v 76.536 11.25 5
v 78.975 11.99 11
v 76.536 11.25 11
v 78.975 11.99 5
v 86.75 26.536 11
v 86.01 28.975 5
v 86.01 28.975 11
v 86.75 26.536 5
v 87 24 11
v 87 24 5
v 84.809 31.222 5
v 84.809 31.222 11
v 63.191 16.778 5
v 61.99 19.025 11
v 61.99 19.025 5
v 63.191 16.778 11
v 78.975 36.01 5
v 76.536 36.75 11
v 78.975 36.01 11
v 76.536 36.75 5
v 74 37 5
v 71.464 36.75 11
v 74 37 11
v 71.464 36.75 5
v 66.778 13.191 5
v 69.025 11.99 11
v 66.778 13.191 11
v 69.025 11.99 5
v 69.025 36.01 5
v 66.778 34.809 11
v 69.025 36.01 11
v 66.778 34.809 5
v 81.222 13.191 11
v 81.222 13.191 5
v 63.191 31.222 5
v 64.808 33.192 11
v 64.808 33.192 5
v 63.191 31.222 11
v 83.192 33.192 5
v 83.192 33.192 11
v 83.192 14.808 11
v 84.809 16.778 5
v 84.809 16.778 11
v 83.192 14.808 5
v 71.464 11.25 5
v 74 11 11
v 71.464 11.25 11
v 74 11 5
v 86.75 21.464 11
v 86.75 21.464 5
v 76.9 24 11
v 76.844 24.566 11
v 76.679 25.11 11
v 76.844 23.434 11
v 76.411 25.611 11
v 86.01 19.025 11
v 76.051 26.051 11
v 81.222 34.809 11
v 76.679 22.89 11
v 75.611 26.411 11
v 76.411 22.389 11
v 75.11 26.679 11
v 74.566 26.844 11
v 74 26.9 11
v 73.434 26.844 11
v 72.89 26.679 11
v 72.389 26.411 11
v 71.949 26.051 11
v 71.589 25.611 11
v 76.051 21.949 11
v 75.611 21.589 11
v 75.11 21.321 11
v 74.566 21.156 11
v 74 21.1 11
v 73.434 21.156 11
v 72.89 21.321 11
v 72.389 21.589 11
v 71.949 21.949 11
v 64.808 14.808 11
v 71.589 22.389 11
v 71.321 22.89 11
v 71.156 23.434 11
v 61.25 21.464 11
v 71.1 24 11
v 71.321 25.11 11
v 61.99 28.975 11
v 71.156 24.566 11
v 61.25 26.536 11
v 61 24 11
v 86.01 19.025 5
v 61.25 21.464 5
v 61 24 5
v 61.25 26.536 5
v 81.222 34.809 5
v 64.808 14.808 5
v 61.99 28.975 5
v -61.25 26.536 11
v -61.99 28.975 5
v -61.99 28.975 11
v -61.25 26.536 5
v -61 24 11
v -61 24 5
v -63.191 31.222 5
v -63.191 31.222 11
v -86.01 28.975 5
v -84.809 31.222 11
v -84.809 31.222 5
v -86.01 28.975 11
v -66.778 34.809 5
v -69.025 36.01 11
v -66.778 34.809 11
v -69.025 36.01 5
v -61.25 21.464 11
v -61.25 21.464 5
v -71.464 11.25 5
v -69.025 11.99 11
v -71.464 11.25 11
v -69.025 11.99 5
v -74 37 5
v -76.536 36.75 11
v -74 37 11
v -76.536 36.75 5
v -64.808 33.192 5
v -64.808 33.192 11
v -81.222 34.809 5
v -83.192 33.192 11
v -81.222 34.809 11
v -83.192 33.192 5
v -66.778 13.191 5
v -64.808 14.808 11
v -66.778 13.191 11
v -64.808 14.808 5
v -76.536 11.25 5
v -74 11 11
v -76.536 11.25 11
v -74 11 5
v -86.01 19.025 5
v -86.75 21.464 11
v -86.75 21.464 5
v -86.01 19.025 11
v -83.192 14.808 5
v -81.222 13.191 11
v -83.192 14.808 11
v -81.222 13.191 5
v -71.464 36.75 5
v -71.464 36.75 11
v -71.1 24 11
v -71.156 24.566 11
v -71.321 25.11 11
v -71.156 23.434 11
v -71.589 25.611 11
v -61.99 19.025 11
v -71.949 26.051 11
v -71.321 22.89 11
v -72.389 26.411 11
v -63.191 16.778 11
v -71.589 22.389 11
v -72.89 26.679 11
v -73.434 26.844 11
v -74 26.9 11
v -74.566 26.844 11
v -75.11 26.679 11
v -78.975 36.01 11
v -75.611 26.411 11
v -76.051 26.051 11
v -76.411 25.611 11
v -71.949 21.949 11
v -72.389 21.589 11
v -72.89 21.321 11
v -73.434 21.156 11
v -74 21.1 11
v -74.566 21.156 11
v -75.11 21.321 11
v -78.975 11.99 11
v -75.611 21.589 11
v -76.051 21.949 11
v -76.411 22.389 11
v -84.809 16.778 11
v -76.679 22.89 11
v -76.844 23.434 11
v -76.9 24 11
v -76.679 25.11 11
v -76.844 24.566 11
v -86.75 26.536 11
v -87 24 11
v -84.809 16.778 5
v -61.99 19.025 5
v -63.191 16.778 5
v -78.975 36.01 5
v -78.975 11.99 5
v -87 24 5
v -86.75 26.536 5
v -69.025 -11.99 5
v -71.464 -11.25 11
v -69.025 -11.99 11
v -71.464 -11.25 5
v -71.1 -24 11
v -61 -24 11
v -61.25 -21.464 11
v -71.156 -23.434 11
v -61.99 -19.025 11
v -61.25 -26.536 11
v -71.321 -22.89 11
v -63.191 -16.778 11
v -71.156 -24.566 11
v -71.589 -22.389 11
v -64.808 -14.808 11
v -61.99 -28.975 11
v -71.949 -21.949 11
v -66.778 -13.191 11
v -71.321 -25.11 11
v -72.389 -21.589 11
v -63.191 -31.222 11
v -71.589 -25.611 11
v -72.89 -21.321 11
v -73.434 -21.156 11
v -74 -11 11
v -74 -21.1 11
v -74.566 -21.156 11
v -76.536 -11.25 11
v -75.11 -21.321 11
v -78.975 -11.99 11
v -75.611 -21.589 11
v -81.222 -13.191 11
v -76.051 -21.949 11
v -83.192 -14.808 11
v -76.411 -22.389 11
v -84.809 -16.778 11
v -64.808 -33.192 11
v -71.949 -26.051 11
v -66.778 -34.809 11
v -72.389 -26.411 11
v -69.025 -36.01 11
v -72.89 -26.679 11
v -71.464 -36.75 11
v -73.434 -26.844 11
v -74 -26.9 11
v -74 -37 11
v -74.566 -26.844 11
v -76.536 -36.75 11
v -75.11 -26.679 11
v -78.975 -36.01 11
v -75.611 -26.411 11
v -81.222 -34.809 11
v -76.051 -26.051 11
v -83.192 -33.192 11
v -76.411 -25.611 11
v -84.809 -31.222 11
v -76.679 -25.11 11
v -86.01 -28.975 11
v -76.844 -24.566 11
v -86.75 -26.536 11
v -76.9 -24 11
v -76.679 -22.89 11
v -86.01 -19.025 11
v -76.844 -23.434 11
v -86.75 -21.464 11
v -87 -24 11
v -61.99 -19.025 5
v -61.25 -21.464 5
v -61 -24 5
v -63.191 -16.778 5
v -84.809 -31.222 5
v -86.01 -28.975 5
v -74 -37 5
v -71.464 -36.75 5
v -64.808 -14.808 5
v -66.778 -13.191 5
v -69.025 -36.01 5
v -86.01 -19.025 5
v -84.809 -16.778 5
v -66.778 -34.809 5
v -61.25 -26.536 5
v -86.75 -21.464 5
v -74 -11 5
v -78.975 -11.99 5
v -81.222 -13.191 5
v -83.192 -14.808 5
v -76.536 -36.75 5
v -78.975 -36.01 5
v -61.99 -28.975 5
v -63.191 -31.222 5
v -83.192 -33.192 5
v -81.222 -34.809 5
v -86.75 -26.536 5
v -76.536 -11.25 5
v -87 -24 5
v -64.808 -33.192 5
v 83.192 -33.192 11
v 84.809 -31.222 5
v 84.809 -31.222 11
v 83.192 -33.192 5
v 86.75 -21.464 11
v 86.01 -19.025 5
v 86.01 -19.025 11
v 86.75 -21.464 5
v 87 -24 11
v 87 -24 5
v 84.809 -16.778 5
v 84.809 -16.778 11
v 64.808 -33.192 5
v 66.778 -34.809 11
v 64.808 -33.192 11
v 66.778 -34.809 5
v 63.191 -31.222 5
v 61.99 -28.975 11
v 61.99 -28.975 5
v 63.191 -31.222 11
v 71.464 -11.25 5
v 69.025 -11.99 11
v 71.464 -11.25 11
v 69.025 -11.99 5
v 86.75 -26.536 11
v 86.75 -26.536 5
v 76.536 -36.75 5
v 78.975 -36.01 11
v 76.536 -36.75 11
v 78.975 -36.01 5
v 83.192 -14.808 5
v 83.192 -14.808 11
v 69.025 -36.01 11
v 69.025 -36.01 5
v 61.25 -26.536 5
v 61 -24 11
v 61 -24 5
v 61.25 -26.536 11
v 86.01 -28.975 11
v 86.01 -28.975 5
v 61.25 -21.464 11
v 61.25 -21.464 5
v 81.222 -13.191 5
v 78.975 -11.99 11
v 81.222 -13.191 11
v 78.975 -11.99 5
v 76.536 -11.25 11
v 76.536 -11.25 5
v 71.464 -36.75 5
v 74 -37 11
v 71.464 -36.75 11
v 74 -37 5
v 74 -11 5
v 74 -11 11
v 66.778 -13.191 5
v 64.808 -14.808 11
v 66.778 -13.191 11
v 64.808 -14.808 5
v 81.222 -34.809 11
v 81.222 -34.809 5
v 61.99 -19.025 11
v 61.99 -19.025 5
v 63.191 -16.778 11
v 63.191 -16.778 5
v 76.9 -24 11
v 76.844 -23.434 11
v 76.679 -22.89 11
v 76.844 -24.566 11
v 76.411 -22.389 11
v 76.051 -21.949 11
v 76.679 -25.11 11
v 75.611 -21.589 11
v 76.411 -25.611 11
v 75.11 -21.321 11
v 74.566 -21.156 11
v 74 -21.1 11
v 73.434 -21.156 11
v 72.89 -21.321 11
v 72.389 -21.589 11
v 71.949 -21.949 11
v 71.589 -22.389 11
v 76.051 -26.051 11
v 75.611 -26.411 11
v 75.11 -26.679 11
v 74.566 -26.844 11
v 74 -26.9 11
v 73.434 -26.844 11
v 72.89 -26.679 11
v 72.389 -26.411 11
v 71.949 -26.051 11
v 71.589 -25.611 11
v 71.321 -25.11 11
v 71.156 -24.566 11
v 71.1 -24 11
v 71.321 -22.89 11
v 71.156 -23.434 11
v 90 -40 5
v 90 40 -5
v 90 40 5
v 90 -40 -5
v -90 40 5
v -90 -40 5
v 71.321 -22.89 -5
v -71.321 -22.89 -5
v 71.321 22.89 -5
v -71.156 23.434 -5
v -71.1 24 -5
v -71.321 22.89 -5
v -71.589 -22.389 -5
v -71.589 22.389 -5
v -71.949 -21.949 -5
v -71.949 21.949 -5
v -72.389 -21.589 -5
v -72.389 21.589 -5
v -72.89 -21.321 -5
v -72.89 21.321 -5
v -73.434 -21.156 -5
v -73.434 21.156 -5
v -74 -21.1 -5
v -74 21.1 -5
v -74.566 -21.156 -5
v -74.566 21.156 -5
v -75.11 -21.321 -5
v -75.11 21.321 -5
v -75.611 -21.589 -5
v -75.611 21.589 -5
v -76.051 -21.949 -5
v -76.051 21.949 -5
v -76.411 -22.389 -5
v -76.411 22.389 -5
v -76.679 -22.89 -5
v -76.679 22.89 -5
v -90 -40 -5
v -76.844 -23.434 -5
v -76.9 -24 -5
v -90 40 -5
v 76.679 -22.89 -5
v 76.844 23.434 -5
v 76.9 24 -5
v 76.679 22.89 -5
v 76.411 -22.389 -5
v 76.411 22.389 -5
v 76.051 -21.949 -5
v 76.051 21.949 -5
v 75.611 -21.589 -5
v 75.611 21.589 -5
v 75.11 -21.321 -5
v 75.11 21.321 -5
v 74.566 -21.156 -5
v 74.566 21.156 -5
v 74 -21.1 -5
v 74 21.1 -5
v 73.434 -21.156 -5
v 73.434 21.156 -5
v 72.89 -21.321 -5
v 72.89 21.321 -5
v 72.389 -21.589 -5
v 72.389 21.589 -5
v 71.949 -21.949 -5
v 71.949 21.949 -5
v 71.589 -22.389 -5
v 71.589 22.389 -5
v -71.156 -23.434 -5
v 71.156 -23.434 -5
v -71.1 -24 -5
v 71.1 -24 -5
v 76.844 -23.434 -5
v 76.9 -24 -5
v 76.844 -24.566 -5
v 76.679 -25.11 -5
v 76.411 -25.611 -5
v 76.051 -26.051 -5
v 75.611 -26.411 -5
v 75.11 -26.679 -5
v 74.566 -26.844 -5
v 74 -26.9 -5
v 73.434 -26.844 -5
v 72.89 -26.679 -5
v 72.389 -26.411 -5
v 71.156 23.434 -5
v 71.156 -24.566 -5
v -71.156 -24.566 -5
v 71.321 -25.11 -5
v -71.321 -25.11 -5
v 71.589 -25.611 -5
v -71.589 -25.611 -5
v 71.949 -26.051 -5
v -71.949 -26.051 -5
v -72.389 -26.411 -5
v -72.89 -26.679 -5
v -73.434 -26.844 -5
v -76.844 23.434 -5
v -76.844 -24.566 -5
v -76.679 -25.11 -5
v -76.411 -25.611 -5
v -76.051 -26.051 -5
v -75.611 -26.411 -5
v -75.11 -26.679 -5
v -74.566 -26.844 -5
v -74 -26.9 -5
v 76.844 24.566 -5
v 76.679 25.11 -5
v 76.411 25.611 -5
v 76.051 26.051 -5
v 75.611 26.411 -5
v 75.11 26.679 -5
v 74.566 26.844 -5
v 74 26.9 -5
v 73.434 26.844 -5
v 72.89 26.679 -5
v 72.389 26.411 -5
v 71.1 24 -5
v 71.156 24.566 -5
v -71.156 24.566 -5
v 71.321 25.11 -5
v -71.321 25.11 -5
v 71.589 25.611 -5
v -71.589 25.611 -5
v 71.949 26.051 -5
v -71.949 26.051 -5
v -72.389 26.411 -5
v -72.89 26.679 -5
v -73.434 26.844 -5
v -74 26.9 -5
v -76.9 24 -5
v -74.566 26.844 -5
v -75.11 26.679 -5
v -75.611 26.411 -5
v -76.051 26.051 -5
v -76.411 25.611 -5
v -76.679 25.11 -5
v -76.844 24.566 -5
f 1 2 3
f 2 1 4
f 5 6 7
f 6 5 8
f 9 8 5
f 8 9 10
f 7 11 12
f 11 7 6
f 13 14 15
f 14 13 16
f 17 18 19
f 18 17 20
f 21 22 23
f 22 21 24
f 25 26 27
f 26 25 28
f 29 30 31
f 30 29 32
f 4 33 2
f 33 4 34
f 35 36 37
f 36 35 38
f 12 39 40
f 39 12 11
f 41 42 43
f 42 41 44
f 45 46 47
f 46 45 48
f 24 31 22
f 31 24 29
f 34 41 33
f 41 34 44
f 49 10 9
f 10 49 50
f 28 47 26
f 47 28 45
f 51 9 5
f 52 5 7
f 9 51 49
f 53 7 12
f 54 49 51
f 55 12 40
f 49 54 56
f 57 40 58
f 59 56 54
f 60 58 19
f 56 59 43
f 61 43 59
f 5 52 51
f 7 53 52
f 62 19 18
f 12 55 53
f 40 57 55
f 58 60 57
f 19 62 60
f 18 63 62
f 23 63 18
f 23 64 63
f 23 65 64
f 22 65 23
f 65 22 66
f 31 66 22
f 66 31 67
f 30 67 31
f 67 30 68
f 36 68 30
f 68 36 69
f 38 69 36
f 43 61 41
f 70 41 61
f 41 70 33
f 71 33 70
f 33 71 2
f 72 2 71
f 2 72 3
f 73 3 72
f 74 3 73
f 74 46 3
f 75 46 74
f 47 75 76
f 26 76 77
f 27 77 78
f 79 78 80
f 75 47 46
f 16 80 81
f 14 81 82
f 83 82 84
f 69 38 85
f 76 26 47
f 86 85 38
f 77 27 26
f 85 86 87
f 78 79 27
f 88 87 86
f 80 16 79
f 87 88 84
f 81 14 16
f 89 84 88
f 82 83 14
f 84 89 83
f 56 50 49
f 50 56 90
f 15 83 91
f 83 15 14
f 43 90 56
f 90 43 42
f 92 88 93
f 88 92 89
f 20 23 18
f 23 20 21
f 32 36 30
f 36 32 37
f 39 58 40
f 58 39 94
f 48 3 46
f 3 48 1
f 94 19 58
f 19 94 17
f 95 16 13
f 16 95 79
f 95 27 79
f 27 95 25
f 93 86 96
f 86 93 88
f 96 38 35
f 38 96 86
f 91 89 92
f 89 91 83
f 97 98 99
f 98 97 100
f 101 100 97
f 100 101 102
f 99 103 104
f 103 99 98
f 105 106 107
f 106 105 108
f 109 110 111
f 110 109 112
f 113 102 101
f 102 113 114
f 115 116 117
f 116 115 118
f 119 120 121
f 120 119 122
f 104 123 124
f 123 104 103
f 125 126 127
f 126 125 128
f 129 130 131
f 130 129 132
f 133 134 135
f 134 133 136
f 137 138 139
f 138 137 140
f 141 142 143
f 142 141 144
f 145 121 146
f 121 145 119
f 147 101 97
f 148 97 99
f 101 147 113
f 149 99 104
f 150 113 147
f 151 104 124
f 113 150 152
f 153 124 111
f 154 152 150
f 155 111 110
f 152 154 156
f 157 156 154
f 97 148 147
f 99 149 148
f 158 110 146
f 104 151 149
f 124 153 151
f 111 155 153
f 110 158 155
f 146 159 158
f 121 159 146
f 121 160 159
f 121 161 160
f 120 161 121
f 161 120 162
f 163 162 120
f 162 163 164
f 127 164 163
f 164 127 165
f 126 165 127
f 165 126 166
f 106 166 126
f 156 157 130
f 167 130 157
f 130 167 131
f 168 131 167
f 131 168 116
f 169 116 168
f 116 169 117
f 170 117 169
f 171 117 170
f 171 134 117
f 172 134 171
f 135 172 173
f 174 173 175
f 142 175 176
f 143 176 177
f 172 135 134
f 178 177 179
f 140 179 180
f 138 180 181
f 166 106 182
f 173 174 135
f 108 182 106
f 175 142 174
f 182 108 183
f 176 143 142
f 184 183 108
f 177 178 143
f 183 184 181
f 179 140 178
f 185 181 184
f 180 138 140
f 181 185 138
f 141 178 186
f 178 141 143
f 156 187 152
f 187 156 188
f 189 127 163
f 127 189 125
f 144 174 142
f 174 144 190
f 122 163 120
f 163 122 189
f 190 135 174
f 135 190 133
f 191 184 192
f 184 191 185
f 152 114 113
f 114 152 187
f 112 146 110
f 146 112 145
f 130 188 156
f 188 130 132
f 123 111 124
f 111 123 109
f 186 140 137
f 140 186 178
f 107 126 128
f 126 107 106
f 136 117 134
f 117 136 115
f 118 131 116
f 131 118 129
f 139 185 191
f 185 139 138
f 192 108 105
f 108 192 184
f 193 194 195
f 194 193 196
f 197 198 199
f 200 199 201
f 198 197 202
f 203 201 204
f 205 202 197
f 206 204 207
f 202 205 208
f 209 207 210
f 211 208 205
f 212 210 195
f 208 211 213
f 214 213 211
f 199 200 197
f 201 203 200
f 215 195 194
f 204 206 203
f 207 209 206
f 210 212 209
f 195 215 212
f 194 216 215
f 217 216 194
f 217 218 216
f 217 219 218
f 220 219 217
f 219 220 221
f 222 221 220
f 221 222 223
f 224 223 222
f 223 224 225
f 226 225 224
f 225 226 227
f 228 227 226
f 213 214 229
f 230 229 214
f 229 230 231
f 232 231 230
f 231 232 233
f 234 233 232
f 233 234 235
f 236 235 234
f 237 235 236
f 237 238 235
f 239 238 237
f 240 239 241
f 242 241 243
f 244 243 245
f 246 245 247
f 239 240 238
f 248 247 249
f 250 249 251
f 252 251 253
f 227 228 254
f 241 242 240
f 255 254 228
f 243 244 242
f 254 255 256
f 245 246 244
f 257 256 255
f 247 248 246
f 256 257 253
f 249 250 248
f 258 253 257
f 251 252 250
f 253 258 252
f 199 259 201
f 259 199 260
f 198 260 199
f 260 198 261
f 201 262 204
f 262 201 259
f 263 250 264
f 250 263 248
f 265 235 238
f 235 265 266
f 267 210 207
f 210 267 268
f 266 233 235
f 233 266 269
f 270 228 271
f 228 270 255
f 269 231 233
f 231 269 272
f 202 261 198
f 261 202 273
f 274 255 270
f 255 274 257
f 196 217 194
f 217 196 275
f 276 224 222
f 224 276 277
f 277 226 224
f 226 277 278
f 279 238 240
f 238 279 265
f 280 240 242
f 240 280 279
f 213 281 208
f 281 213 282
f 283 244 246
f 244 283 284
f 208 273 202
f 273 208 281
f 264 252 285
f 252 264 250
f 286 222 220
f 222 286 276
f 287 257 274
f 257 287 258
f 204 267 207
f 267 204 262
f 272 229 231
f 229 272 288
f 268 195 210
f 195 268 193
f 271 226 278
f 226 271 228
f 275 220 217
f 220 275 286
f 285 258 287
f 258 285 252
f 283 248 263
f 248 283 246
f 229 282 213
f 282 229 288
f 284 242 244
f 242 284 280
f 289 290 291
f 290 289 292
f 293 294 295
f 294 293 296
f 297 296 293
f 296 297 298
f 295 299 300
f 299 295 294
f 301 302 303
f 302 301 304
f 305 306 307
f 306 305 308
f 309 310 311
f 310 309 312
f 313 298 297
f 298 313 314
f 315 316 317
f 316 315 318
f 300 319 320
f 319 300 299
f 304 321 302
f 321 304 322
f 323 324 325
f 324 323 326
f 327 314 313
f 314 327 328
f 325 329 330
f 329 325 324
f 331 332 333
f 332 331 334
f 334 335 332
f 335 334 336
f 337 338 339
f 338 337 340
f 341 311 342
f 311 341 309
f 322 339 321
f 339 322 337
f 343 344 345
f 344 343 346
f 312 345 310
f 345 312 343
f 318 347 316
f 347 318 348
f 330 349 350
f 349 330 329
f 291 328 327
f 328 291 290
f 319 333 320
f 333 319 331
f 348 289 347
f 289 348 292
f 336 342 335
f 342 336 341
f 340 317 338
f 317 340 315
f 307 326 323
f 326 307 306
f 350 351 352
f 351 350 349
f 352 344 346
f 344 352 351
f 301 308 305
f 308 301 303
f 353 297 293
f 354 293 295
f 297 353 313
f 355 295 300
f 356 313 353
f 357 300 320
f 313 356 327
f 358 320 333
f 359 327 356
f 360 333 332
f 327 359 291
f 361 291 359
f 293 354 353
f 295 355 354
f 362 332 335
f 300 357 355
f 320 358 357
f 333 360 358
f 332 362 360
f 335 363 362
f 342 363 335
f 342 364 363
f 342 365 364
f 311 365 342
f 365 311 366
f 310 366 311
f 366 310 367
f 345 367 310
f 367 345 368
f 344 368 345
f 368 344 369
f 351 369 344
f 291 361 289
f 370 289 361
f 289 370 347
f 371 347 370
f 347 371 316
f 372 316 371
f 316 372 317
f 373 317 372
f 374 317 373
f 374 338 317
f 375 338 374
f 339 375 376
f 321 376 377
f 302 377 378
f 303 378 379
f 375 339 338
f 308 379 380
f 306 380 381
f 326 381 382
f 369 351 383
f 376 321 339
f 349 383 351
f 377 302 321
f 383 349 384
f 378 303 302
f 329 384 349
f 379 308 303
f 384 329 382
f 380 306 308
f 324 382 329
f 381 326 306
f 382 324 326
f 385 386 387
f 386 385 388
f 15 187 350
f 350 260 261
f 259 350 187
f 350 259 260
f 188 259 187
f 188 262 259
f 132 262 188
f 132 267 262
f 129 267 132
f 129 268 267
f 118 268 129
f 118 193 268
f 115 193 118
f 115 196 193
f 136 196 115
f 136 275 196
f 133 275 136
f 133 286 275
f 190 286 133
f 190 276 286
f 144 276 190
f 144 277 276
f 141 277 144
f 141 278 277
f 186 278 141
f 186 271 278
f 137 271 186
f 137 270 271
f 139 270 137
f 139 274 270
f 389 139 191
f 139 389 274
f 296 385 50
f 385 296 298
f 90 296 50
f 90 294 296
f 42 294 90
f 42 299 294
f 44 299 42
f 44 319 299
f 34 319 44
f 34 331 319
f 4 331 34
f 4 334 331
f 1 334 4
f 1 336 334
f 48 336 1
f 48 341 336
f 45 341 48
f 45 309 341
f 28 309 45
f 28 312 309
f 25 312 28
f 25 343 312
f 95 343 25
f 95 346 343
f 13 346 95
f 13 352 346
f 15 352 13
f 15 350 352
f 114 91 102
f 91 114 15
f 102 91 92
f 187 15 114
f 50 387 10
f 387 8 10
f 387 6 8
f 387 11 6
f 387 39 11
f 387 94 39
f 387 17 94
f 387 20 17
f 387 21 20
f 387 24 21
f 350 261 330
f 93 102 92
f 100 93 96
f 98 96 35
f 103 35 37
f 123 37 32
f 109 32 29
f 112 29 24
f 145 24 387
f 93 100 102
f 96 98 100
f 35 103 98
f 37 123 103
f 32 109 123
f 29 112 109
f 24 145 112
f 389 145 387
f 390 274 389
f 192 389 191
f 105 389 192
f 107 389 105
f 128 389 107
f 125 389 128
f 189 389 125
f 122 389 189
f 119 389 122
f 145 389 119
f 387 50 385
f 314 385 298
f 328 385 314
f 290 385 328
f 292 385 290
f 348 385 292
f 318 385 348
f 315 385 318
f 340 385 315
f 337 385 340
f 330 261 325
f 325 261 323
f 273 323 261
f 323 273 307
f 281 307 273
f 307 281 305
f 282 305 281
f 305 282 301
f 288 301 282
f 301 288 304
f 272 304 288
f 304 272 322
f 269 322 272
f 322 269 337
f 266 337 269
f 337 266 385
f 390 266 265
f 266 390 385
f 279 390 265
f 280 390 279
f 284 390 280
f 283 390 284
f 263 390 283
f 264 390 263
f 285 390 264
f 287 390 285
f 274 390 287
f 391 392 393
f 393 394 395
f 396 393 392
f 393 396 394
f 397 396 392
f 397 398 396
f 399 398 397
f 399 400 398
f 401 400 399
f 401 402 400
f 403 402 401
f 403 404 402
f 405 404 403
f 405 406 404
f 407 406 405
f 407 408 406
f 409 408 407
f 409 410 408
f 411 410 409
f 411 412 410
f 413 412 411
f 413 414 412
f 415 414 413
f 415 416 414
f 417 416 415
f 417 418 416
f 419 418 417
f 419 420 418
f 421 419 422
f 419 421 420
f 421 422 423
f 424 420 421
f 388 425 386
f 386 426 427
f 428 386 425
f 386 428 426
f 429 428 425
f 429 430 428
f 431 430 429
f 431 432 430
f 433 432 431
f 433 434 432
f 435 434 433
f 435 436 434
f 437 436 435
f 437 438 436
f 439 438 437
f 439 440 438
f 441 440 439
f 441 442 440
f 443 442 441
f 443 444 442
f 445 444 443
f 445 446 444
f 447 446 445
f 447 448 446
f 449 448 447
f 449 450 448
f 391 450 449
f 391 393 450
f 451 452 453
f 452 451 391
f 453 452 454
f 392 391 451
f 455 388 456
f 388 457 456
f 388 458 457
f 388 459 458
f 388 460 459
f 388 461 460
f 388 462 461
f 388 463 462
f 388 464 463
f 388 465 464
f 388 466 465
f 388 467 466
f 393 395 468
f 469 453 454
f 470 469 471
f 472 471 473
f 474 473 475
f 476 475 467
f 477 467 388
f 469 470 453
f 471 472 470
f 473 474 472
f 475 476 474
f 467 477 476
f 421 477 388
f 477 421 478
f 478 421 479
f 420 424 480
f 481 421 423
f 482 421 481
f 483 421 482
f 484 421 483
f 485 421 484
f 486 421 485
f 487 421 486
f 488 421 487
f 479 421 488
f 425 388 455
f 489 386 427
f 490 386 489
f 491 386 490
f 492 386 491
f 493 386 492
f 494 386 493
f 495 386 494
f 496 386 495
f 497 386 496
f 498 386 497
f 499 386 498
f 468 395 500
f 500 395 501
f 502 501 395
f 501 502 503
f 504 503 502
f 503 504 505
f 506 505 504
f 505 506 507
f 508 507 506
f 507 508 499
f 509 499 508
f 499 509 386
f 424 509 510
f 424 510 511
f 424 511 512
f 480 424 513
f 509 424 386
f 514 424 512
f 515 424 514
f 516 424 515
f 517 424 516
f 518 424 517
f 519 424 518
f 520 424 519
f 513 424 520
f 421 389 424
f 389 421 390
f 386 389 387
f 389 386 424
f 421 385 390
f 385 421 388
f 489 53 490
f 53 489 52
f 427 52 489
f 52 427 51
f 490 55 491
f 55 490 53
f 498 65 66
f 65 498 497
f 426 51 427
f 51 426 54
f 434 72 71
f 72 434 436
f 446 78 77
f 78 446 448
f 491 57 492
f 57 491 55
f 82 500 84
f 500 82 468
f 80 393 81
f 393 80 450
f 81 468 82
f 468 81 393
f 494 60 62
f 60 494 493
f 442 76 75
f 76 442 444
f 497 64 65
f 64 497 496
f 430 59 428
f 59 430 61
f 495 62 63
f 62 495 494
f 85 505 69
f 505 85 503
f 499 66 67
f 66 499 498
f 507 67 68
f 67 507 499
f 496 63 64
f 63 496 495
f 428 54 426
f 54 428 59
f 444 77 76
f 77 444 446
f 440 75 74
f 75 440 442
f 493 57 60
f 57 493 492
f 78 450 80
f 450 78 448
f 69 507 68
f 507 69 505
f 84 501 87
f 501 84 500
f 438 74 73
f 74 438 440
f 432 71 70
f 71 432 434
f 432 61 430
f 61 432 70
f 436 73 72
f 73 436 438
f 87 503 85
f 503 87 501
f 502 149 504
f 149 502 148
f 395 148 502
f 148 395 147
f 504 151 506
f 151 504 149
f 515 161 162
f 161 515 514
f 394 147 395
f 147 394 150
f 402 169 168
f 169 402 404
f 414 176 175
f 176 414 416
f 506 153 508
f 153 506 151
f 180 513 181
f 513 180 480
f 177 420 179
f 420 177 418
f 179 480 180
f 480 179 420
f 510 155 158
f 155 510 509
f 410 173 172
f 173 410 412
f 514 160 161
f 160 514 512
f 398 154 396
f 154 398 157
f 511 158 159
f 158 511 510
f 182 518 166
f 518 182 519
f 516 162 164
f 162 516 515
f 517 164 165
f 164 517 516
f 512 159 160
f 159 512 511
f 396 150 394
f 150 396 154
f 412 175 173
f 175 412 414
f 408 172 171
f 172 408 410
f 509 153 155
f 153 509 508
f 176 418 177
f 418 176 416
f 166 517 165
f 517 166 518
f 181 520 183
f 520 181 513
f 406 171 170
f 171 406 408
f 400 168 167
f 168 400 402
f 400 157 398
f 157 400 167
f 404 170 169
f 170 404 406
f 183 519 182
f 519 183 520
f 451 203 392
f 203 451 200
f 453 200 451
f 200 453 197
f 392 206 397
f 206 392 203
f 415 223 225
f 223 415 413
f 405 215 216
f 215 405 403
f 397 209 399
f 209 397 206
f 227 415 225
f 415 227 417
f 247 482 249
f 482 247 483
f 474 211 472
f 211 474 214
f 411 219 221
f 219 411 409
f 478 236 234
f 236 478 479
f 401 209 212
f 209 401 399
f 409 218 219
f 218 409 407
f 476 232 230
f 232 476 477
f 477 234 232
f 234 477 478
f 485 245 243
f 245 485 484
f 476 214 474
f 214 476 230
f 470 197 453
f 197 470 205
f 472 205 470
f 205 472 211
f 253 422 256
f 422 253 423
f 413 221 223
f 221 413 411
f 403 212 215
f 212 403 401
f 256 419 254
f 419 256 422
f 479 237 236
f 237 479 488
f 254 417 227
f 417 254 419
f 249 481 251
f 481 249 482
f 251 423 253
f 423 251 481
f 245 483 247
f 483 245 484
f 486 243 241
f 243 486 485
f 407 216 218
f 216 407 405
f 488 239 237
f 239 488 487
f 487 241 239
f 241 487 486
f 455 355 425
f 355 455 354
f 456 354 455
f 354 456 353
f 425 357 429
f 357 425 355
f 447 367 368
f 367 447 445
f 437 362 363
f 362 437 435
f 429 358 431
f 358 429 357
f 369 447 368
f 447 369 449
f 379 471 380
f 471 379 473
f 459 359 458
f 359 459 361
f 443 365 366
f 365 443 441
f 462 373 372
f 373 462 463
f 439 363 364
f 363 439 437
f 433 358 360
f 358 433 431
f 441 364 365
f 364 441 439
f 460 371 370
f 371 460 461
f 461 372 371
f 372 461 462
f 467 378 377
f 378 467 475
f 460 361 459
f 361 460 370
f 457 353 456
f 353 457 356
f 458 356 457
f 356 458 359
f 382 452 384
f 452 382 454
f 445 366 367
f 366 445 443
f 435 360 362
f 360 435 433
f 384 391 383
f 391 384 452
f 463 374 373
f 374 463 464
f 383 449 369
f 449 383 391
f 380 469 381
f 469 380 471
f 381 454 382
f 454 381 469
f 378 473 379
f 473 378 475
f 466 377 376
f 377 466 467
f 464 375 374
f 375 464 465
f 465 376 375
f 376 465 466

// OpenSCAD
$fn = 32;

// ----------------------------------------------------------------------
// Anchor pads 180 x 80 x 16
// four corner bosses with anchor holes
// ----------------------------------------------------------------------

// --- parameters (mm) ---
plate = [180, 80, 10];  // base plate size (x, y, z)
pads = 4;               // boss count, one per corner
edge = 16;              // boss centre offset from the plate edge
boss_d = 26;            // boss diameter
boss_h = 6;             // boss height above the base plate
bore_d = 5.5;           // nominal hole diameter from the drawing
print_allowance = 0.3;  // clearance added for printing

// --- derived feature positions (mm) ---
hole_d = bore_d + print_allowance;  // = 5.8   hole diameter as printed
height = plate[2] + boss_h;         // = 16   overall height of the part
corner_x = plate[0] / 2 - edge;     // = 74   boss centre X
corner_y = plate[1] / 2 - edge;     // = 24   boss centre Y
feature_centers = [
  [corner_x, corner_y],
  [-corner_x, corner_y],
  [-corner_x, -corner_y],
  [corner_x, -corner_y]
];   // boss centres, anchor holes are drilled there

// base plate, four bosses standing on it, anchor holes all the way through
difference() {
  union() {
    cube(plate, center = true);
    for (centre = feature_centers)
      translate([centre[0], centre[1], plate[2] / 2 - 1])
        cylinder(d = boss_d, h = boss_h + 1);
  }
  for (centre = feature_centers)
    translate([centre[0], centre[1], -height])
      cylinder(d = hole_d, h = 2 * height + 2);  // through boss and plate
}
